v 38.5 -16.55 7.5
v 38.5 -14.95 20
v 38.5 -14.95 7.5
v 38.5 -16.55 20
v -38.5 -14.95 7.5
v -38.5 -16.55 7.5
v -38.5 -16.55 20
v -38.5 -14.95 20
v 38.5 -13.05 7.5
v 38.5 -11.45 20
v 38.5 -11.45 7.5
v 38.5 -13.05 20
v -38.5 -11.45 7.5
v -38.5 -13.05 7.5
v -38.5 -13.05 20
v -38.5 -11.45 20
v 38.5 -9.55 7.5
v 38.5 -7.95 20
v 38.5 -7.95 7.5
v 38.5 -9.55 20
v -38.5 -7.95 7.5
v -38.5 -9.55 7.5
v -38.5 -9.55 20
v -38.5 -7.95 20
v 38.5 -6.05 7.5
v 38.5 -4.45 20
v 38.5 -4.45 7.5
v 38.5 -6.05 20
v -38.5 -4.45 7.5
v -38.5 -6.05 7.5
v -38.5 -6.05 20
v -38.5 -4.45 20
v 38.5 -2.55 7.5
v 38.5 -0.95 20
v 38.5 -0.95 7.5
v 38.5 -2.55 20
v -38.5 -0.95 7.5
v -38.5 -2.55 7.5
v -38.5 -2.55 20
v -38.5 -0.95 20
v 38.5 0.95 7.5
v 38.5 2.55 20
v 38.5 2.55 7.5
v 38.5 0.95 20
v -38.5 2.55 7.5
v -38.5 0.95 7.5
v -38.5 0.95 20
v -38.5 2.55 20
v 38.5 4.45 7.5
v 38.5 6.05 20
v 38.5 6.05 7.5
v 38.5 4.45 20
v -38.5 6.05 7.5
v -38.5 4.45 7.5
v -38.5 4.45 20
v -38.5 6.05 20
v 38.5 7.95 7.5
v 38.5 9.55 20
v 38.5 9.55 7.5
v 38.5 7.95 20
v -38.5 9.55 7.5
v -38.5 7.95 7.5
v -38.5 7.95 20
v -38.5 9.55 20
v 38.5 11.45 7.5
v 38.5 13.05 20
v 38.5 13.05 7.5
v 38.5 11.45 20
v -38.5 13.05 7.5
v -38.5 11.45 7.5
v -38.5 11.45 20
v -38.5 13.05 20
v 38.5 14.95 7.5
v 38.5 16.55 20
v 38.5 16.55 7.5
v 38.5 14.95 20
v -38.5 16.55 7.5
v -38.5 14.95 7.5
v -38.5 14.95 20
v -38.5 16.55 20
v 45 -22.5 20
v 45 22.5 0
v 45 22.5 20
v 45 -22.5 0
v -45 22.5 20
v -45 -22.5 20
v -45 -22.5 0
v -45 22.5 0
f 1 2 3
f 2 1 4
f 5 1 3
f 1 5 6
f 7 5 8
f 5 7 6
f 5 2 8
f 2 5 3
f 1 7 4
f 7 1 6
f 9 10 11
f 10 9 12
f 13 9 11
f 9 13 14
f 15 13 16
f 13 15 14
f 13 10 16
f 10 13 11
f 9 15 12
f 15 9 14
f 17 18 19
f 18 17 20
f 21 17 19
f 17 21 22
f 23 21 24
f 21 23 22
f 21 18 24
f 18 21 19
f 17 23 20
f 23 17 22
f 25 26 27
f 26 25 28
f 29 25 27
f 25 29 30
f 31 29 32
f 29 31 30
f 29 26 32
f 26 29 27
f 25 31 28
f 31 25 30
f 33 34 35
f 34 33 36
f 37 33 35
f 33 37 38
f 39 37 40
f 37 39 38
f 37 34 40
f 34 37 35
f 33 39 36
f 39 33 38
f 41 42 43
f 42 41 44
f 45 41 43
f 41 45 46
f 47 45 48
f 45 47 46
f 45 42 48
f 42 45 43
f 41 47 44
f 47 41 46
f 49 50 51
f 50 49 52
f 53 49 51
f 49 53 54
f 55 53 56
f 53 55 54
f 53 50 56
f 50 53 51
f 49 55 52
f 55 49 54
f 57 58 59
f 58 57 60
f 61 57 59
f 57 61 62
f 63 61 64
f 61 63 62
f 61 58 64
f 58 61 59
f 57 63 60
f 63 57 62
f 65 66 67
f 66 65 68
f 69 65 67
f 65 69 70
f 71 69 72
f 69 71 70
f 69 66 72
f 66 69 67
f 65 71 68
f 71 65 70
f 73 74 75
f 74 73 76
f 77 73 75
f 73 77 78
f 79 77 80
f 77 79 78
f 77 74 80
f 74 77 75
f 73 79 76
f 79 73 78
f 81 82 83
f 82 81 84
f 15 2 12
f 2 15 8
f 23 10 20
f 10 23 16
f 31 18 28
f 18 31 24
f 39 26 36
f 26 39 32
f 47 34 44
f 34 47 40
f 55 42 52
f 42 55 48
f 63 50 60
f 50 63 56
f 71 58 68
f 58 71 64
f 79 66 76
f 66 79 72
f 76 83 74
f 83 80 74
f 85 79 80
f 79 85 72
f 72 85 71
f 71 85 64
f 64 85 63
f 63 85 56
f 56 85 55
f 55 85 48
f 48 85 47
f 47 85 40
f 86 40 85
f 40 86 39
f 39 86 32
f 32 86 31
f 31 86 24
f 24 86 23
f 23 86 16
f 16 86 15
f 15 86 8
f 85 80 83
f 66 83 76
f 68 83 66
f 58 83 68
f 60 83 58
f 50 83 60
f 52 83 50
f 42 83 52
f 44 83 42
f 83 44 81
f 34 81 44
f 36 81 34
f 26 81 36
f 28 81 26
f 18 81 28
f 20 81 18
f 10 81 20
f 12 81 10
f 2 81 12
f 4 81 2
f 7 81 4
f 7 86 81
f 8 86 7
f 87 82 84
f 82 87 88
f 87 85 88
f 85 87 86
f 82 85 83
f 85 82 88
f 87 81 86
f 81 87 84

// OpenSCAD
// Drying rack for 10 microscope slides (75 x 25 x 1 mm) standing on edge
// Category: benchware. Block with parallel slots; prints without supports.
// Print: PLA or PETG, 0.2 mm layers, 20 % infill. Check slot width with a real slide.
// SPDX-License-Identifier: CERN-OHL-P-2.0

/* [Rack] */
block = [90, 45, 20];  // X, Y, Z [mm]
n_slots = 10;
slot_pitch = 3.5;      // centre-to-centre [mm]
slot_w = 1.6;          // 1.0-1.2 mm slides + clearance
slot_len = 77;         // along X, slide is 75 mm long
slot_depth = 12.5;

/* [Hidden] */
eps = 0.01;

difference() {
    translate([-block.x / 2, -block.y / 2, 0]) cube(block);
    for (i = [0 : n_slots - 1])
        translate([-slot_len / 2, (i - (n_slots - 1) / 2) * slot_pitch - slot_w / 2, block.z - slot_depth])
            cube([slot_len, slot_w, slot_depth + eps]);
}
